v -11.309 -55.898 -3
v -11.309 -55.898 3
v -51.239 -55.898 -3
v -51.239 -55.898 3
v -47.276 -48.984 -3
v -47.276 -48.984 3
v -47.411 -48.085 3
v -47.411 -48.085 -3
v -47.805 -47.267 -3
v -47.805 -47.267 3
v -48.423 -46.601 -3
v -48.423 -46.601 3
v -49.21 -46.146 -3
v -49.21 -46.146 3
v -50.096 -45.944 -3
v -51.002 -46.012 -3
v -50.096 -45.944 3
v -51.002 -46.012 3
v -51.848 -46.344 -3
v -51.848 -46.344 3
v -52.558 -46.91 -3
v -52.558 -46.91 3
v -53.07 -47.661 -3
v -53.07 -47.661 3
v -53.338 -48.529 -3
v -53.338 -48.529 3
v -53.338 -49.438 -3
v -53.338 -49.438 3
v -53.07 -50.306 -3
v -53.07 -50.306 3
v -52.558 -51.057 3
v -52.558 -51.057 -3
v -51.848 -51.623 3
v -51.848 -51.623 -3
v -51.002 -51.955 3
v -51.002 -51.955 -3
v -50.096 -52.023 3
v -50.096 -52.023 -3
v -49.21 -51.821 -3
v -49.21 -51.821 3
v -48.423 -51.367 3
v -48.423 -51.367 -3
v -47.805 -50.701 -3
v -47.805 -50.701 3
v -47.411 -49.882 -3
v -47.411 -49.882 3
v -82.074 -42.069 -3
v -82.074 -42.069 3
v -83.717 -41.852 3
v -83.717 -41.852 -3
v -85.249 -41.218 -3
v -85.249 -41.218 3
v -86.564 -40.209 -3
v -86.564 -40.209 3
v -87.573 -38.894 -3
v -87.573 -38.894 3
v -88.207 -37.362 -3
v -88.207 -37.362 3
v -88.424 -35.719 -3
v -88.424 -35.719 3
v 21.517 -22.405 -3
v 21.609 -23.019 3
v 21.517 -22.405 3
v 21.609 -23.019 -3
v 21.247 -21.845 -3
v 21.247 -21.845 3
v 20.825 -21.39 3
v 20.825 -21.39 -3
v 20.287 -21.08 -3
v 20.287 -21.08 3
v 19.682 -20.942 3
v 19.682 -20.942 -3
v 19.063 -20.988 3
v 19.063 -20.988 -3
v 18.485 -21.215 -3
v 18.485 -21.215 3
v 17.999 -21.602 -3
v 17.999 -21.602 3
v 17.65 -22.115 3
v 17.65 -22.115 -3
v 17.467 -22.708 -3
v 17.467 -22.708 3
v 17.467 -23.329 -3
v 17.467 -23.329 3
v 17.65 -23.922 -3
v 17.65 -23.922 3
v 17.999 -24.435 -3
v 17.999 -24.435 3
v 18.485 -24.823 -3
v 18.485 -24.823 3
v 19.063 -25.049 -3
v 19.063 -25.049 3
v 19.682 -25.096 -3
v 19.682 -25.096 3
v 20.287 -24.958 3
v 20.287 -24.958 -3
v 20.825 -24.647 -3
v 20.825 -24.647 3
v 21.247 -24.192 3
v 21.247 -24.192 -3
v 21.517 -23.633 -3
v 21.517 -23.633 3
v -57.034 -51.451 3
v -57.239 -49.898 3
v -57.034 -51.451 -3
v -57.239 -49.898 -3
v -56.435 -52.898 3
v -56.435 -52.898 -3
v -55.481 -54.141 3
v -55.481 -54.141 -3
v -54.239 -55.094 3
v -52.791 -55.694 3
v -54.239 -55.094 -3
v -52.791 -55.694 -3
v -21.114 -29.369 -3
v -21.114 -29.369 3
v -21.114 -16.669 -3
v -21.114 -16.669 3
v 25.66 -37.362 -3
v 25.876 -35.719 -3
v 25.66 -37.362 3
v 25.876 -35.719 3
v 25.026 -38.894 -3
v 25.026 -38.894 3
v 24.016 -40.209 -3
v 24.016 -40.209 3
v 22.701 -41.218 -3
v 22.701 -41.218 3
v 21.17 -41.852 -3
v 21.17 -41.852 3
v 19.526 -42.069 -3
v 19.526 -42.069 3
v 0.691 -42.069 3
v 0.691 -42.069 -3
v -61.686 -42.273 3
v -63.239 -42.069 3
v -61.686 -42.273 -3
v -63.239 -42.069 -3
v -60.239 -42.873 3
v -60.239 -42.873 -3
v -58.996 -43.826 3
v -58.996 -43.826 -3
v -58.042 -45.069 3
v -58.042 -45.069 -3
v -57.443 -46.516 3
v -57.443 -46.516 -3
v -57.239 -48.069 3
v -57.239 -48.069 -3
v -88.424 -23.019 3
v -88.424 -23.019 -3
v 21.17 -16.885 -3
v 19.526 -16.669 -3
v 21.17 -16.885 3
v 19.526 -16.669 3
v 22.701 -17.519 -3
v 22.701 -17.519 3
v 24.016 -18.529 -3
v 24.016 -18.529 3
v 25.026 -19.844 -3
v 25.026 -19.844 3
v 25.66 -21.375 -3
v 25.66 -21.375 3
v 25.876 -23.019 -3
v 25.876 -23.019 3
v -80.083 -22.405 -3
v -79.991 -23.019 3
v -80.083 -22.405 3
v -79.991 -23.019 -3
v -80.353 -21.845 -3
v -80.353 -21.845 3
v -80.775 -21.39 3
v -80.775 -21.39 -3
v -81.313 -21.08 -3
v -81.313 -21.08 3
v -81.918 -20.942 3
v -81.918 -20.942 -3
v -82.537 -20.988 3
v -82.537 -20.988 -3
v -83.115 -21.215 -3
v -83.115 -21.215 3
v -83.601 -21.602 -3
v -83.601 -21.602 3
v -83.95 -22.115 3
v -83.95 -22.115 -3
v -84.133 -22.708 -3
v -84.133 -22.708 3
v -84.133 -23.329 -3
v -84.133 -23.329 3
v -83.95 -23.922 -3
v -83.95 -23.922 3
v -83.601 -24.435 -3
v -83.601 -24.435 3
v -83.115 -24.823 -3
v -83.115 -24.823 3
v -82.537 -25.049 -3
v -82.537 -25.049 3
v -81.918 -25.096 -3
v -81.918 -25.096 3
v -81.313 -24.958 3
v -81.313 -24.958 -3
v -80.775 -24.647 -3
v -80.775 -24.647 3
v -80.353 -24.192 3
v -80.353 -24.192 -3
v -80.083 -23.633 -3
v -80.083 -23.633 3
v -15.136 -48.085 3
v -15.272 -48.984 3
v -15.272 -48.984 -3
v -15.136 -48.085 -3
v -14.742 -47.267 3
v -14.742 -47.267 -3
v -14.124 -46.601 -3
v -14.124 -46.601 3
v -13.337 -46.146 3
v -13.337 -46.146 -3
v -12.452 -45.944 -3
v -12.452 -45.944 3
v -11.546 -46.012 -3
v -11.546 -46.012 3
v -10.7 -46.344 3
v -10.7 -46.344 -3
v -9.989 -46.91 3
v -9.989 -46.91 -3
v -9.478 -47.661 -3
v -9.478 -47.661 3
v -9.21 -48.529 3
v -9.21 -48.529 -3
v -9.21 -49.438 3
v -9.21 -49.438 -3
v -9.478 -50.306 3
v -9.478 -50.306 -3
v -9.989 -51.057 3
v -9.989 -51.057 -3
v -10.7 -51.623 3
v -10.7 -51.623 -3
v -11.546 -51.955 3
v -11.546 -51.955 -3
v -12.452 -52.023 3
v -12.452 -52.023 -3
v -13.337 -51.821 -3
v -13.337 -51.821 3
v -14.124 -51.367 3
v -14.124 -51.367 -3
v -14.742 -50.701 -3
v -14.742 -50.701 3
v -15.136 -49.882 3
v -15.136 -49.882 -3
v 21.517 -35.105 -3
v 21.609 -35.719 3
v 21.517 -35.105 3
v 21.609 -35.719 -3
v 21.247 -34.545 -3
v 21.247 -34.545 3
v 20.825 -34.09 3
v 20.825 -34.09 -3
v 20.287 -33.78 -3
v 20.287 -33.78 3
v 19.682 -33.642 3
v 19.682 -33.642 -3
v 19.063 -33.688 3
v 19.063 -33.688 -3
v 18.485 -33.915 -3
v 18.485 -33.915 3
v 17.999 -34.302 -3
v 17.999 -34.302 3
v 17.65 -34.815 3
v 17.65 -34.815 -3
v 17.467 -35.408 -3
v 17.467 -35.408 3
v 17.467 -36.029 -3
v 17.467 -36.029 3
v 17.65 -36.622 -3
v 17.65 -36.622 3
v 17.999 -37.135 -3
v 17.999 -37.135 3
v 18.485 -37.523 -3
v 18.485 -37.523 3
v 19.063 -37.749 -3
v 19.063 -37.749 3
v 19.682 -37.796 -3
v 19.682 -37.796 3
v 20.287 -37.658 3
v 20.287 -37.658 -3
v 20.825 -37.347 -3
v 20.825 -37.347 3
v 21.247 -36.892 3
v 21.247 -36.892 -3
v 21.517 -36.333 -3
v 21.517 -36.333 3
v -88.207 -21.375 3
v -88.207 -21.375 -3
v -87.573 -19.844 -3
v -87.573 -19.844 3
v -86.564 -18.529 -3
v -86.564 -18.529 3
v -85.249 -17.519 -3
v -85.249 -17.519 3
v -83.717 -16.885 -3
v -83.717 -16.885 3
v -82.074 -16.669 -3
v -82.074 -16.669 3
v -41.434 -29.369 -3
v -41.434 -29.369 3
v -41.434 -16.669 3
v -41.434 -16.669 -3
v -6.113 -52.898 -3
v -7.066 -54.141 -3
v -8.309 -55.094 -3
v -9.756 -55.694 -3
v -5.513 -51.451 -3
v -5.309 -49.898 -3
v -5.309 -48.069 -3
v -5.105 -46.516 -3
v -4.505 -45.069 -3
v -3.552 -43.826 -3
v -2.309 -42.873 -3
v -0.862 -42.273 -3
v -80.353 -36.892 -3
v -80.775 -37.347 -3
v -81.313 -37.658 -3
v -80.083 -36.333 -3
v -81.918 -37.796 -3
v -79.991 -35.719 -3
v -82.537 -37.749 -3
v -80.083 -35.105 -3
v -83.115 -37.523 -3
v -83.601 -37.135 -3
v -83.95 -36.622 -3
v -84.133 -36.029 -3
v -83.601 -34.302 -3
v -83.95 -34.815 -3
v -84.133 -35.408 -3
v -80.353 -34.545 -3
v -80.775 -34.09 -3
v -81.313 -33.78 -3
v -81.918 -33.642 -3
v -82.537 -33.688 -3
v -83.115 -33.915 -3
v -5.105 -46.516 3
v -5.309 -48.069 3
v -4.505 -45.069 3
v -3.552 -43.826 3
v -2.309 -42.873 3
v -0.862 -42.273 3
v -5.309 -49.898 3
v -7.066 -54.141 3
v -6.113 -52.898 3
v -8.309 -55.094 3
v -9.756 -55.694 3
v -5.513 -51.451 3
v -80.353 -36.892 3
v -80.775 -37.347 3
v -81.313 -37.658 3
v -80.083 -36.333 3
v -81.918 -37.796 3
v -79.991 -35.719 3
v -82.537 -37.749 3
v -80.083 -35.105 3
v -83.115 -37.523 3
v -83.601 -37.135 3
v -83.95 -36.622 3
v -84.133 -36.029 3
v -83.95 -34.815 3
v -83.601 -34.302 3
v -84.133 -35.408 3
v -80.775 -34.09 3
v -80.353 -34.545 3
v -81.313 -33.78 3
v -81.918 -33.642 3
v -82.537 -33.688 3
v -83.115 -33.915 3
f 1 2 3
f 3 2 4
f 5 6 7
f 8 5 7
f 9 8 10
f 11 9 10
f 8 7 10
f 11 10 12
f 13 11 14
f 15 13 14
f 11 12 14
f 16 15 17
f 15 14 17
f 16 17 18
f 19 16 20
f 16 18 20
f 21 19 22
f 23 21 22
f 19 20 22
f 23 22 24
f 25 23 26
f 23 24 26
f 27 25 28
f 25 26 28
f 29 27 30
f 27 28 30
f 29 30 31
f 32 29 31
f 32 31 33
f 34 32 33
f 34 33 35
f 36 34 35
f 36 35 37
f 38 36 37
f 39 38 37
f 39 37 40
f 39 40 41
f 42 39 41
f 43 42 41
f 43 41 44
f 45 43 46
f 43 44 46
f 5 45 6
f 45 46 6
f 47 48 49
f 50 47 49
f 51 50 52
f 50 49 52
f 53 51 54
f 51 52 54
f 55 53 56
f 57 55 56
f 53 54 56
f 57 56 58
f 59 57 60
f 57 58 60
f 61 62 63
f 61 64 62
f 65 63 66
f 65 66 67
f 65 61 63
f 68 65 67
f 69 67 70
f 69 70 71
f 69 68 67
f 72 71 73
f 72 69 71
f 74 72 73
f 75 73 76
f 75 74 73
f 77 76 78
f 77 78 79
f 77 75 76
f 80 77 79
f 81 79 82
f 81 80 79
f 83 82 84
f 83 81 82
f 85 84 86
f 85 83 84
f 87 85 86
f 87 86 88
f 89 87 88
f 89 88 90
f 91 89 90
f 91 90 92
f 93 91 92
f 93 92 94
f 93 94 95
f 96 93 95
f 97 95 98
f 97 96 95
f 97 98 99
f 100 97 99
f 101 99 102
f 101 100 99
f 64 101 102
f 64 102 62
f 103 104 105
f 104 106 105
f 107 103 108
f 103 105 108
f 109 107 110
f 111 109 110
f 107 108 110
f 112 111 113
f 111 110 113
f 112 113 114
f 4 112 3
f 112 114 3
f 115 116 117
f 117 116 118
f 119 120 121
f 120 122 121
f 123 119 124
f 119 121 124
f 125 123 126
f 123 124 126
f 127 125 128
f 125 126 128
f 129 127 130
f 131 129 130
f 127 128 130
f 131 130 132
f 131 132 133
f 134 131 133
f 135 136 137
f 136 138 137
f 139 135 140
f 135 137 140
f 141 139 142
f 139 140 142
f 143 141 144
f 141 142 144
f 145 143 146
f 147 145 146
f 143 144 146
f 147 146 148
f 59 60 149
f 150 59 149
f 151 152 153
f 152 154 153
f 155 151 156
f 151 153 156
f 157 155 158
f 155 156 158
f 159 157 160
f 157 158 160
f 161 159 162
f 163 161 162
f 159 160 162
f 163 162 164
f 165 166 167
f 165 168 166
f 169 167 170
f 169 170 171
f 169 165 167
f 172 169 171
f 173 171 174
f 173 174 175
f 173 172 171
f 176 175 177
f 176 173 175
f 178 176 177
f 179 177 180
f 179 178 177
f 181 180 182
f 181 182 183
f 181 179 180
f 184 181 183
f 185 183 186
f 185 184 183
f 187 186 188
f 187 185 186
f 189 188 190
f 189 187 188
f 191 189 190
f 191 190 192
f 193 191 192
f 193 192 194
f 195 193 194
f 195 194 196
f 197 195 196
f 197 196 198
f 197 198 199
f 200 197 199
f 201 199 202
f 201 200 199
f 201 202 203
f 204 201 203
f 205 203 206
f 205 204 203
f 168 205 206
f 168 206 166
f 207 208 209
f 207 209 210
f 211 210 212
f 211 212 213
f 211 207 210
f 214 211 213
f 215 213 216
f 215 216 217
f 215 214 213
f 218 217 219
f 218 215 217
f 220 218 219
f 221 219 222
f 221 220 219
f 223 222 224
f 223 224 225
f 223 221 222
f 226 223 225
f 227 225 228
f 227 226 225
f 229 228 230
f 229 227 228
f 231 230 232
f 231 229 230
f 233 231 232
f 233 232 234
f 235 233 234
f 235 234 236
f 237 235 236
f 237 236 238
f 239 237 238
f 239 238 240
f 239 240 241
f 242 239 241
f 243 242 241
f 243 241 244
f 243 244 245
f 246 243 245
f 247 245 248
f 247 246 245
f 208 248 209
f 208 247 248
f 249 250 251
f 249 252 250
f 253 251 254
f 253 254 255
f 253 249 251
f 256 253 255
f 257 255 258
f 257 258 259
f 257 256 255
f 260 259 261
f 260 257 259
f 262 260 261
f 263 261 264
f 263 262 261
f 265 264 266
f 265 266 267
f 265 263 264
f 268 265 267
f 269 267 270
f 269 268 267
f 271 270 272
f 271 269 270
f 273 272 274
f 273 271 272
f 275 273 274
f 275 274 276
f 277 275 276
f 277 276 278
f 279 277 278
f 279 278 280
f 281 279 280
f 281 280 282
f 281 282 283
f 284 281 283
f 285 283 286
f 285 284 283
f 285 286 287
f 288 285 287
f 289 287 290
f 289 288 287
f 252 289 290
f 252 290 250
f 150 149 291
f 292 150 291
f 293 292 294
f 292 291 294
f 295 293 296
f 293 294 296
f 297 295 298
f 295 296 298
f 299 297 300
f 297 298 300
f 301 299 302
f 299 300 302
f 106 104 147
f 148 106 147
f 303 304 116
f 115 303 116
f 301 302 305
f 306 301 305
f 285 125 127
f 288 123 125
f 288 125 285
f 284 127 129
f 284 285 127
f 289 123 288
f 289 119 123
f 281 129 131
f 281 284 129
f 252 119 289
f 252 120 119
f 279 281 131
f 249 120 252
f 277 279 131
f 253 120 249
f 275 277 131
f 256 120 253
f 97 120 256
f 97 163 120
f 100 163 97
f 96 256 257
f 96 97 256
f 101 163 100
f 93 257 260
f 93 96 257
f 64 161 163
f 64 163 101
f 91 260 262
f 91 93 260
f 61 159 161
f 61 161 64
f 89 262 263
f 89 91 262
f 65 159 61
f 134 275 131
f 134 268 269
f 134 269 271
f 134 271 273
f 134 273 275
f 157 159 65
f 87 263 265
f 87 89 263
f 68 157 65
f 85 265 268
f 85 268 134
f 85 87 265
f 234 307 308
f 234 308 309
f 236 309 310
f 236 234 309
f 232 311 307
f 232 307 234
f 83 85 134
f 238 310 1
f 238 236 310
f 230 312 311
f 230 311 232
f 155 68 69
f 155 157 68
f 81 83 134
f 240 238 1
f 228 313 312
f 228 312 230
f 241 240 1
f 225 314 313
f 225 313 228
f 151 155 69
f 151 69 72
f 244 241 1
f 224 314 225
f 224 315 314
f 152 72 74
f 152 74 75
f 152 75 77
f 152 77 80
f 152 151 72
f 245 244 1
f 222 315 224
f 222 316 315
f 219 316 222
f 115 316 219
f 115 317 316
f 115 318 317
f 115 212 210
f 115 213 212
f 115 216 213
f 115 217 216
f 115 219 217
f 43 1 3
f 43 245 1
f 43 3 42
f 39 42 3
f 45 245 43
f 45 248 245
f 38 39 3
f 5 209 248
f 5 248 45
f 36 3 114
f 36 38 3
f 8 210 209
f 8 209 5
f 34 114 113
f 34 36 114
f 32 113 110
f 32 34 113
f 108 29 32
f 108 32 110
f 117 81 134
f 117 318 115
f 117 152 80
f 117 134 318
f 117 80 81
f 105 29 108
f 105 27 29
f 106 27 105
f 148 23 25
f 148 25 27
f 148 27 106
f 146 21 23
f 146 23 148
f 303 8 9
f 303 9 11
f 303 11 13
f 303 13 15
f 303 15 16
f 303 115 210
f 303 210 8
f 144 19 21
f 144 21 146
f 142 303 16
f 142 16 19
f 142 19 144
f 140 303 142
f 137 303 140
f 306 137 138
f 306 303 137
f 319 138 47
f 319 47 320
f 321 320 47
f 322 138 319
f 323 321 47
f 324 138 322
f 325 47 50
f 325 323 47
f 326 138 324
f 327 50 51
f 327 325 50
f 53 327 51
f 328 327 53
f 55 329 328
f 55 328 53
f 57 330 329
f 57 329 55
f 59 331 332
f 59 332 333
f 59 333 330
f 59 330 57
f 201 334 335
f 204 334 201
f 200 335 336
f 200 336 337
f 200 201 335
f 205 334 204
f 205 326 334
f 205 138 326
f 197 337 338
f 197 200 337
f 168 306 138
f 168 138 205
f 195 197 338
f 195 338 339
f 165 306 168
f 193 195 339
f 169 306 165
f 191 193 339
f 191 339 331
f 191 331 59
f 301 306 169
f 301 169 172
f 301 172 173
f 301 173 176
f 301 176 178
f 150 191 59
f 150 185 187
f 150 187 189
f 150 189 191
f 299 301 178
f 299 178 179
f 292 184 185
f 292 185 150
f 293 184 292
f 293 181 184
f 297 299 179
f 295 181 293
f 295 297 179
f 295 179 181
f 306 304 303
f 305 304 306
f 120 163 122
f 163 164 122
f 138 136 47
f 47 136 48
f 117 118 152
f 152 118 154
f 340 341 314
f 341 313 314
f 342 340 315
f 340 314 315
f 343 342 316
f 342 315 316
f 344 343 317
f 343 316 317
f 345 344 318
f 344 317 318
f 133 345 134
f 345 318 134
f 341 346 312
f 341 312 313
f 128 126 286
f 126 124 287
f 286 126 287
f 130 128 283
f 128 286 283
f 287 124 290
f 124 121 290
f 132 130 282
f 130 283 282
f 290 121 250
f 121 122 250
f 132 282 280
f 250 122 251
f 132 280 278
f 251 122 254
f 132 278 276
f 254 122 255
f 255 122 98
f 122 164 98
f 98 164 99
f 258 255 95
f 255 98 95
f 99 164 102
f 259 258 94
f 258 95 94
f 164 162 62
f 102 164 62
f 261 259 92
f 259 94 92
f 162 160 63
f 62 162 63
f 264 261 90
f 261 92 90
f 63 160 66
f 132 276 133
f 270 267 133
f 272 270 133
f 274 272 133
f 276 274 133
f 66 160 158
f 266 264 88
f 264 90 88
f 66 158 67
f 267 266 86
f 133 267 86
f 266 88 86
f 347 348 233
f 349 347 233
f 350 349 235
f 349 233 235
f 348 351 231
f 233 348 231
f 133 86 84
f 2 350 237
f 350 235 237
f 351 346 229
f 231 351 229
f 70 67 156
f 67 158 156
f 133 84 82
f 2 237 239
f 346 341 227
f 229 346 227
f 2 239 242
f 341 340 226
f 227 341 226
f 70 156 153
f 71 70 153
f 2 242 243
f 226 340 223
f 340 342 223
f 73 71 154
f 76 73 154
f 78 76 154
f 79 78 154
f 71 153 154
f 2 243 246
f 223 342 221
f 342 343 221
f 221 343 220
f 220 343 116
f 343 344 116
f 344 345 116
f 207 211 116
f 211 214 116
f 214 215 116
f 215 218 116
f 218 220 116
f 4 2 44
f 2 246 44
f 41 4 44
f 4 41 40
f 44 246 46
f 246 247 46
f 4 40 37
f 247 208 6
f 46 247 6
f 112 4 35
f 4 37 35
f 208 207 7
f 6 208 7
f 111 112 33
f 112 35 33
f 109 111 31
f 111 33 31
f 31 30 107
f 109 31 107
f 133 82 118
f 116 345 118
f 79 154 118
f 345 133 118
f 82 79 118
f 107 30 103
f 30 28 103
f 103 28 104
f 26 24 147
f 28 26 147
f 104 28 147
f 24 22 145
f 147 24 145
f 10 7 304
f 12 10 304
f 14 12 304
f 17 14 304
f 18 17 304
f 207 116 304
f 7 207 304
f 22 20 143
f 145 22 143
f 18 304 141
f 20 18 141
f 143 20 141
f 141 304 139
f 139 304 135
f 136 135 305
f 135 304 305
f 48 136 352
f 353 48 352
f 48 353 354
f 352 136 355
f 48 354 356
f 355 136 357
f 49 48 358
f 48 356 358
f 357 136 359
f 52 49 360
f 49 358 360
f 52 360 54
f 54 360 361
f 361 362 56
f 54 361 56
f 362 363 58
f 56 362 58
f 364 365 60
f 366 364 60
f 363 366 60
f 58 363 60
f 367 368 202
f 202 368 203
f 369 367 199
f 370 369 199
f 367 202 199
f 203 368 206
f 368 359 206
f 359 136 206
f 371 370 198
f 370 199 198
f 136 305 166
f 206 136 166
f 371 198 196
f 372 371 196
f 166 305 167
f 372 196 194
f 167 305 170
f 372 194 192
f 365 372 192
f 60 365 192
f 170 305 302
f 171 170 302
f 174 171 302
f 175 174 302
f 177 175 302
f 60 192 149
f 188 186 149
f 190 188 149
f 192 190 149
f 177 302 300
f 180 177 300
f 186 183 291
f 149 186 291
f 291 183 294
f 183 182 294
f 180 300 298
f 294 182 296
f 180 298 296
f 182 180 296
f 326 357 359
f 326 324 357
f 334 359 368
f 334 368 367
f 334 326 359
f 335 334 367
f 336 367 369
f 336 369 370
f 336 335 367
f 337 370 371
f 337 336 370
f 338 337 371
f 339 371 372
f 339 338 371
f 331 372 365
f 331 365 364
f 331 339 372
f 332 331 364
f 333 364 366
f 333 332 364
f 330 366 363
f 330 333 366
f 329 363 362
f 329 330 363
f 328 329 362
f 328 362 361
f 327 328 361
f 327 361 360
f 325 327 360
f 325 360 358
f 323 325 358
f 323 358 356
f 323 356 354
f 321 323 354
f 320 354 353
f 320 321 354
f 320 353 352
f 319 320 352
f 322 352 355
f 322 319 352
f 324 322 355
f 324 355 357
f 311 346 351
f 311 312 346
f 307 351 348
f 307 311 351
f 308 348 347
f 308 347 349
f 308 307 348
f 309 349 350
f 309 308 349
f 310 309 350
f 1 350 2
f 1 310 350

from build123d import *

# Parameters (mm, degrees)
SKETCH1_R            = 2.0828
BOSS_EXTRUDE1_DEPTH  = 3
SKETCH2_W            = 20.32
SKETCH2_H            = 12.7
CUT_EXTRUDE1_DEPTH   = 99.104736331
SKETCH3_W            = 25.964797213
SKETCH3_H            = 13.829594426
SKETCH3_R            = 3.048
BOSS_EXTRUDE2_DEPTH  = 6
FILLET1_R            = 6
FILLET1_OF_MIRROR1_R = 6


with BuildPart() as part:
    # Sketch1 → Boss-Extrude1 (new, symmetric)
    with BuildSketch(Plane.XY):
        with BuildLine():
            Line((-82.07375, -16.66875), (19.52625, -16.66875))
            ThreePointArc((19.52625, -16.66875), (24.016378061, -18.528621939), (25.87625, -23.01875))
            Line((25.87625, -23.01875), (25.87625, -35.71875))
            ThreePointArc((25.87625, -35.71875), (24.016378061, -40.208878061), (19.52625, -42.06875))
            Line((19.52625, -42.06875), (-82.07375, -42.06875))
            ThreePointArc((-82.07375, -42.06875), (-86.563878061, -40.208878061), (-88.42375, -35.71875))
            Line((-88.42375, -35.71875), (-88.42375, -23.01875))
            ThreePointArc((-88.42375, -23.01875), (-86.563878061, -18.528621939), (-82.07375, -16.66875))
        make_face()
        with Locations((-82.07375, -23.01875)):
            Circle(SKETCH1_R, mode=Mode.SUBTRACT)
        with Locations((19.52625, -23.01875)):
            Circle(SKETCH1_R, mode=Mode.SUBTRACT)
        with Locations((-82.07375, -35.71875)):
            Circle(SKETCH1_R, mode=Mode.SUBTRACT)
        with Locations((19.52625, -35.71875)):
            Circle(SKETCH1_R, mode=Mode.SUBTRACT)
    extrude(amount=BOSS_EXTRUDE1_DEPTH, both=True)

    # Sketch2 → Cut-Extrude1 (cut, through all)
    with BuildSketch(Plane.XY.offset(3)):
        with Locations((-31.27375, -23.01875)):
            Rectangle(SKETCH2_W, SKETCH2_H)
    extrude(amount=-CUT_EXTRUDE1_DEPTH, mode=Mode.SUBTRACT)

    # Sketch3 → Boss-Extrude2 (add)
    with BuildSketch(Plane.XY.offset(3)):
        with Locations((-44.256148607, -48.983547213)):
            Rectangle(SKETCH3_W, SKETCH3_H)
        with Locations((-50.32375, -48.983547213)):
            Circle(SKETCH3_R, mode=Mode.SUBTRACT)
    boss_extrude2 = extrude(amount=-BOSS_EXTRUDE2_DEPTH)

    # Fillet1
    fillet1_edges = [part.edges().sort_by_distance(p)[0] for p in [
        (-57.238547213, -42.06875, 0),
        (-57.238547213, -55.898344426, 0),
    ]]
    fillet(fillet1_edges, radius=FILLET1_R)

    # Mirror1: Boss-Extrude2 across plane
    add(boss_extrude2.mirror(Plane(origin=(-31.27375, -55.898344426, -3), x_dir=(0, 0, 1), z_dir=(1, 0, 0))))

    # Fillet1 of Mirror1
    fillet1_of_mirror1_edges = [part.edges().sort_by_distance(p)[0] for p in [
        (-5.308952787, -42.06875, 0),
        (-5.308952787, -55.898344426, 0),
    ]]
    fillet(fillet1_of_mirror1_edges, radius=FILLET1_OF_MIRROR1_R)


solid = part.part
